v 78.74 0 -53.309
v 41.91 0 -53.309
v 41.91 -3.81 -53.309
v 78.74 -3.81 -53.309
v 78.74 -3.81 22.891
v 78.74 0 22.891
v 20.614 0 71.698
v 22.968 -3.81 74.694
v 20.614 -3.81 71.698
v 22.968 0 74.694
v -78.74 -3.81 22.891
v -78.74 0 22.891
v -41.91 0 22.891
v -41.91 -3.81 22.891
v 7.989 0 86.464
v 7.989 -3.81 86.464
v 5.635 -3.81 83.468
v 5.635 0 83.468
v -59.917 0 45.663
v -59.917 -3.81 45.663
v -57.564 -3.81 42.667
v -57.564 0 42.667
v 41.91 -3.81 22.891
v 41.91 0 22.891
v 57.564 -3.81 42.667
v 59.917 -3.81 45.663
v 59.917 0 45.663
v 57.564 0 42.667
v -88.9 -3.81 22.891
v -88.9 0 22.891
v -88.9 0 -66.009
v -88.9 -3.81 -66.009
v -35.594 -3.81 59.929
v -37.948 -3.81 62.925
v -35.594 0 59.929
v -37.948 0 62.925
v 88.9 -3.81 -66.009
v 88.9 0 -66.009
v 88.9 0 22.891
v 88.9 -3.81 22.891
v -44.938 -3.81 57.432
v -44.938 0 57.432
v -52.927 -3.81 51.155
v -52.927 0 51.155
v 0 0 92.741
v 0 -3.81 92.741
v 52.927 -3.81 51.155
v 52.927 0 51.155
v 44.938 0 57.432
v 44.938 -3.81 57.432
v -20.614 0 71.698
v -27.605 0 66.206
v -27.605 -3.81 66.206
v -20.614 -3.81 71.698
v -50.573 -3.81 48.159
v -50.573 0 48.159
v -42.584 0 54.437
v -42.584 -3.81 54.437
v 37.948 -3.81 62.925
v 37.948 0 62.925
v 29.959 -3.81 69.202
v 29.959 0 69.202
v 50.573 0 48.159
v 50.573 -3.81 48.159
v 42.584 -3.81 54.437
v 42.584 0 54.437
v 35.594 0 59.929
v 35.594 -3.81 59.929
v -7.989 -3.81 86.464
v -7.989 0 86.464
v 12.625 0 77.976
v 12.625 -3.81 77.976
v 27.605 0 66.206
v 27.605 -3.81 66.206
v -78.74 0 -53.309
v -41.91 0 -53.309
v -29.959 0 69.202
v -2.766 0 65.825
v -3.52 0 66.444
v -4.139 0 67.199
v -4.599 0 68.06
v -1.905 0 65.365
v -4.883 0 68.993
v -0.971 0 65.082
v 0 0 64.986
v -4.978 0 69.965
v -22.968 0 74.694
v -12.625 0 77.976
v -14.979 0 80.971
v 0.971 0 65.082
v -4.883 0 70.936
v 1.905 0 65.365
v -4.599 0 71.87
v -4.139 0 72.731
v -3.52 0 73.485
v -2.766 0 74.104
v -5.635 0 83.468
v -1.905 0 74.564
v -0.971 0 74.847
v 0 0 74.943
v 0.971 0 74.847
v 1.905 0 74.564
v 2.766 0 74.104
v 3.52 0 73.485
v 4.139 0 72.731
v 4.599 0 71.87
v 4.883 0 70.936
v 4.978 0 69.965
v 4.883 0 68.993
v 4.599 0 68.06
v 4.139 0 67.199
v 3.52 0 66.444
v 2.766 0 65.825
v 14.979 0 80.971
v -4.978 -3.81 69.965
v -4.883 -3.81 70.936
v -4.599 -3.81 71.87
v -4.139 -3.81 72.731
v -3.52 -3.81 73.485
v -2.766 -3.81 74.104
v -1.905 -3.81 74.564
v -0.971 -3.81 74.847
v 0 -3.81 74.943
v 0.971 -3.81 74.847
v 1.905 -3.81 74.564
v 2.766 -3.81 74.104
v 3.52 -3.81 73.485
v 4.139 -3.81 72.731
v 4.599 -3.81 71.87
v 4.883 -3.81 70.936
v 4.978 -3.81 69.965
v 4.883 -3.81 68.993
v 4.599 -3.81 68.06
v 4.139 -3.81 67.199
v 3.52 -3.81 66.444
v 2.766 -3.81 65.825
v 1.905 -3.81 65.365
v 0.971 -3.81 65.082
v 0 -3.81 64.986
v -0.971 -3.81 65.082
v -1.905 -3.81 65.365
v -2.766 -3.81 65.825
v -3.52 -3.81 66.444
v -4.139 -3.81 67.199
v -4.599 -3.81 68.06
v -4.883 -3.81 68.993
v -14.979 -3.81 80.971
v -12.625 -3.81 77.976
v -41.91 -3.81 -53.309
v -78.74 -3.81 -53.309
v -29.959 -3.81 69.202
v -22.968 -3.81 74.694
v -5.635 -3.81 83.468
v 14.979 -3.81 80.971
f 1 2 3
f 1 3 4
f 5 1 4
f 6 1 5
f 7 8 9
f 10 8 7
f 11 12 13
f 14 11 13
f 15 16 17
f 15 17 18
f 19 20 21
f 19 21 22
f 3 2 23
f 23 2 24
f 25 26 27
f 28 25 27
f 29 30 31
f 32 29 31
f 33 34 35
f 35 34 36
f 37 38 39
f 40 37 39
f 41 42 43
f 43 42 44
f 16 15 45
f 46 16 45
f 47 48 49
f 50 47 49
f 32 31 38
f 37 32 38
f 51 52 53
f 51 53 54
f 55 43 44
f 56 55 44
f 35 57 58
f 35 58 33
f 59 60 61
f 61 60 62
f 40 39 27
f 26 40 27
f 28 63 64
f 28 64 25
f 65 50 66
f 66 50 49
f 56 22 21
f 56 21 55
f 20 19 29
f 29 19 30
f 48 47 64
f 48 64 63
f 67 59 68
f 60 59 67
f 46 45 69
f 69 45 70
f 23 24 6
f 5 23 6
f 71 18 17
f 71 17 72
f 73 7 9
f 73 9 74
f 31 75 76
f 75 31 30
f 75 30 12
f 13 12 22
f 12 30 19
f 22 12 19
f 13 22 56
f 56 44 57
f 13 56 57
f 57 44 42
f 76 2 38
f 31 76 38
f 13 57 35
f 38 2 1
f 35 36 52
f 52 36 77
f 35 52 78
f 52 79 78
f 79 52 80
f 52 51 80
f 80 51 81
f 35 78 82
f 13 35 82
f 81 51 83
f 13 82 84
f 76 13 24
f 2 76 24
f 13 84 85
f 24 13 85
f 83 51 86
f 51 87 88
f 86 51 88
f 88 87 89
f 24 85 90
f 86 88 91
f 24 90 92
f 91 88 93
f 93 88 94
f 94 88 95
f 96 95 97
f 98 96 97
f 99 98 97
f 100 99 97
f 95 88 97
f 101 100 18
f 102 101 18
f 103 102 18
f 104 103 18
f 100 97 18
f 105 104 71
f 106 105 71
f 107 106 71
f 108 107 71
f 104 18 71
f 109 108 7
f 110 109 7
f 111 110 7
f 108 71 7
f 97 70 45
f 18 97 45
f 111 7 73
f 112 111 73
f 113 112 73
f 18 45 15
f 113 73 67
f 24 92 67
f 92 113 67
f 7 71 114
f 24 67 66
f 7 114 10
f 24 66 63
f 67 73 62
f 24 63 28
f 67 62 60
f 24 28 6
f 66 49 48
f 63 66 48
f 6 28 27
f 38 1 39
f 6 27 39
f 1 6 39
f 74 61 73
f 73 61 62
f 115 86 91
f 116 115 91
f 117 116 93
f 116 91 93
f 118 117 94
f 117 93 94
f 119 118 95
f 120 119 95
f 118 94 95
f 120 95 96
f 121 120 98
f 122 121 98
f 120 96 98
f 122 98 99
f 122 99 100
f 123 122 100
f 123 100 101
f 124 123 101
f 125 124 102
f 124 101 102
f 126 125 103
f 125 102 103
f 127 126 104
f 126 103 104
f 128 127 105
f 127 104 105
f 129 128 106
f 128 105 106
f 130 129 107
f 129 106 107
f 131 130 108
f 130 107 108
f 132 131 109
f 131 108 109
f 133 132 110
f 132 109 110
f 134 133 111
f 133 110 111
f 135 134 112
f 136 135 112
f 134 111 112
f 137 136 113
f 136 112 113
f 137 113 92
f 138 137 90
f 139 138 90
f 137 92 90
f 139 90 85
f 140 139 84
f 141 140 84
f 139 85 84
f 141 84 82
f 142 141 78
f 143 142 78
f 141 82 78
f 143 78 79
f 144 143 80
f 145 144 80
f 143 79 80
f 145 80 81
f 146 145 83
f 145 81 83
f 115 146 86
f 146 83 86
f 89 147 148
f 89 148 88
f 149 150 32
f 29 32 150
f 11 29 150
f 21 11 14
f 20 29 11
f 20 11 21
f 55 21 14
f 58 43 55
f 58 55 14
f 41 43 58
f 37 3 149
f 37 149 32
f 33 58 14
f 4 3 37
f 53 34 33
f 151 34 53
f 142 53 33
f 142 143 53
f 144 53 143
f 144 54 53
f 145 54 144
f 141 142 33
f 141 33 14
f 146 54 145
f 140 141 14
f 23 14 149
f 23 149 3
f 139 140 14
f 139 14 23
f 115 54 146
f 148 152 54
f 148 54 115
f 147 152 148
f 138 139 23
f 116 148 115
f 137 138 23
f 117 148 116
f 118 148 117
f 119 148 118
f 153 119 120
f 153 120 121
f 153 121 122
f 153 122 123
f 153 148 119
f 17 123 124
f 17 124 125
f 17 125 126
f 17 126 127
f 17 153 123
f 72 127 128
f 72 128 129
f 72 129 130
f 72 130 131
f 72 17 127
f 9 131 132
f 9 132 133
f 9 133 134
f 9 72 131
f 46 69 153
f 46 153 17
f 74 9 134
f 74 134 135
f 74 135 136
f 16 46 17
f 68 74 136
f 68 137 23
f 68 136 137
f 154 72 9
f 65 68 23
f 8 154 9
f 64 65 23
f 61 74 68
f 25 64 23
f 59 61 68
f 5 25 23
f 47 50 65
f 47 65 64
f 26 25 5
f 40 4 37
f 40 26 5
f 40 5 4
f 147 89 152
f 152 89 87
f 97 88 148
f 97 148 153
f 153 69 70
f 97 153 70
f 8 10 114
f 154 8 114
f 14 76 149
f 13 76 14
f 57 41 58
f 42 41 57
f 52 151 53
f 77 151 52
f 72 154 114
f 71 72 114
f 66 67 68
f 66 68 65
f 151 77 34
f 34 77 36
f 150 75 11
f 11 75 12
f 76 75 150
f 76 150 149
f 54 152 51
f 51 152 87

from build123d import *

# Parameters (mm, degrees)
F0_W     = 36.83
F0_H     = 76.2
F1_DEPTH = 3.81
F2_W     = 8.89
F2_H     = 3.81
F3_DEPTH = 3.81
F4_W     = 8.89
F4_H     = 3.81
F5_DEPTH = 3.81
F6_R     = 4.9784
F7_DEPTH = 3.81


with BuildPart() as f1:
    # F0 (on Front) → F1 (new body)
    with BuildSketch(Plane.XZ):
        Polygon((-88.9, -66.0091239631), (0, -66.0091239631), (88.9, -66.0091239631), (88.9, 22.8908760369), (0, 92.7408760369), (-88.9, 22.8908760369), align=None)
        with Locations((-60.325, -15.2091239631)):
            Rectangle(F0_W, F0_H, mode=Mode.SUBTRACT)
        with Locations((60.325, -15.2091239631)):
            Rectangle(F0_W, F0_H, mode=Mode.SUBTRACT)
    extrude(amount=F1_DEPTH)

    # F2 (on face) → F3 (cut)
    with BuildSketch(Plane(origin=(-45.0539271599, 0, 57.3413618398), x_dir=(0.7863183388, 0, 0.6178215519), z_dir=(-0.6178215519, 0, 0.7863183388))):
        with Locations((-14.4576880394, -1.905)):
            Rectangle(F2_W, F2_H)
        with Locations((23.6423119606, -1.905)):
            Rectangle(F2_W, F2_H)
        with Locations((42.6923119606, -1.905)):
            Rectangle(F2_W, F2_H)
        with Locations((4.5923119606, -1.905)):
            Rectangle(F2_W, F2_H)
    extrude(amount=-F3_DEPTH, mode=Mode.SUBTRACT)

    # F4 (on face) → F5 (cut)
    with BuildSketch(Plane(origin=(45.0539271599, 0, 57.3413618398), x_dir=(0.7863183388, 0, -0.6178215519), z_dir=(0.6178215519, 0, 0.7863183388))):
        with Locations((-42.6923119606, -1.905)):
            Rectangle(F4_W, F4_H)
        with Locations((-23.6423119606, -1.905)):
            Rectangle(F4_W, F4_H)
        with Locations((-4.5923119606, -1.905)):
            Rectangle(F4_W, F4_H)
        with Locations((14.4576880394, -1.905)):
            Rectangle(F4_W, F4_H)
    extrude(amount=-F5_DEPTH, mode=Mode.SUBTRACT)

    # F6 (on face) → F7 (cut)
    with BuildSketch(Plane(origin=(0, 0, 0), x_dir=(-1, 0, 0), z_dir=(0, 1, 0))):
        with Locations((0, 69.9647201129)):
            Circle(F6_R)
    extrude(amount=-F7_DEPTH, mode=Mode.SUBTRACT)


solid = f1.part
